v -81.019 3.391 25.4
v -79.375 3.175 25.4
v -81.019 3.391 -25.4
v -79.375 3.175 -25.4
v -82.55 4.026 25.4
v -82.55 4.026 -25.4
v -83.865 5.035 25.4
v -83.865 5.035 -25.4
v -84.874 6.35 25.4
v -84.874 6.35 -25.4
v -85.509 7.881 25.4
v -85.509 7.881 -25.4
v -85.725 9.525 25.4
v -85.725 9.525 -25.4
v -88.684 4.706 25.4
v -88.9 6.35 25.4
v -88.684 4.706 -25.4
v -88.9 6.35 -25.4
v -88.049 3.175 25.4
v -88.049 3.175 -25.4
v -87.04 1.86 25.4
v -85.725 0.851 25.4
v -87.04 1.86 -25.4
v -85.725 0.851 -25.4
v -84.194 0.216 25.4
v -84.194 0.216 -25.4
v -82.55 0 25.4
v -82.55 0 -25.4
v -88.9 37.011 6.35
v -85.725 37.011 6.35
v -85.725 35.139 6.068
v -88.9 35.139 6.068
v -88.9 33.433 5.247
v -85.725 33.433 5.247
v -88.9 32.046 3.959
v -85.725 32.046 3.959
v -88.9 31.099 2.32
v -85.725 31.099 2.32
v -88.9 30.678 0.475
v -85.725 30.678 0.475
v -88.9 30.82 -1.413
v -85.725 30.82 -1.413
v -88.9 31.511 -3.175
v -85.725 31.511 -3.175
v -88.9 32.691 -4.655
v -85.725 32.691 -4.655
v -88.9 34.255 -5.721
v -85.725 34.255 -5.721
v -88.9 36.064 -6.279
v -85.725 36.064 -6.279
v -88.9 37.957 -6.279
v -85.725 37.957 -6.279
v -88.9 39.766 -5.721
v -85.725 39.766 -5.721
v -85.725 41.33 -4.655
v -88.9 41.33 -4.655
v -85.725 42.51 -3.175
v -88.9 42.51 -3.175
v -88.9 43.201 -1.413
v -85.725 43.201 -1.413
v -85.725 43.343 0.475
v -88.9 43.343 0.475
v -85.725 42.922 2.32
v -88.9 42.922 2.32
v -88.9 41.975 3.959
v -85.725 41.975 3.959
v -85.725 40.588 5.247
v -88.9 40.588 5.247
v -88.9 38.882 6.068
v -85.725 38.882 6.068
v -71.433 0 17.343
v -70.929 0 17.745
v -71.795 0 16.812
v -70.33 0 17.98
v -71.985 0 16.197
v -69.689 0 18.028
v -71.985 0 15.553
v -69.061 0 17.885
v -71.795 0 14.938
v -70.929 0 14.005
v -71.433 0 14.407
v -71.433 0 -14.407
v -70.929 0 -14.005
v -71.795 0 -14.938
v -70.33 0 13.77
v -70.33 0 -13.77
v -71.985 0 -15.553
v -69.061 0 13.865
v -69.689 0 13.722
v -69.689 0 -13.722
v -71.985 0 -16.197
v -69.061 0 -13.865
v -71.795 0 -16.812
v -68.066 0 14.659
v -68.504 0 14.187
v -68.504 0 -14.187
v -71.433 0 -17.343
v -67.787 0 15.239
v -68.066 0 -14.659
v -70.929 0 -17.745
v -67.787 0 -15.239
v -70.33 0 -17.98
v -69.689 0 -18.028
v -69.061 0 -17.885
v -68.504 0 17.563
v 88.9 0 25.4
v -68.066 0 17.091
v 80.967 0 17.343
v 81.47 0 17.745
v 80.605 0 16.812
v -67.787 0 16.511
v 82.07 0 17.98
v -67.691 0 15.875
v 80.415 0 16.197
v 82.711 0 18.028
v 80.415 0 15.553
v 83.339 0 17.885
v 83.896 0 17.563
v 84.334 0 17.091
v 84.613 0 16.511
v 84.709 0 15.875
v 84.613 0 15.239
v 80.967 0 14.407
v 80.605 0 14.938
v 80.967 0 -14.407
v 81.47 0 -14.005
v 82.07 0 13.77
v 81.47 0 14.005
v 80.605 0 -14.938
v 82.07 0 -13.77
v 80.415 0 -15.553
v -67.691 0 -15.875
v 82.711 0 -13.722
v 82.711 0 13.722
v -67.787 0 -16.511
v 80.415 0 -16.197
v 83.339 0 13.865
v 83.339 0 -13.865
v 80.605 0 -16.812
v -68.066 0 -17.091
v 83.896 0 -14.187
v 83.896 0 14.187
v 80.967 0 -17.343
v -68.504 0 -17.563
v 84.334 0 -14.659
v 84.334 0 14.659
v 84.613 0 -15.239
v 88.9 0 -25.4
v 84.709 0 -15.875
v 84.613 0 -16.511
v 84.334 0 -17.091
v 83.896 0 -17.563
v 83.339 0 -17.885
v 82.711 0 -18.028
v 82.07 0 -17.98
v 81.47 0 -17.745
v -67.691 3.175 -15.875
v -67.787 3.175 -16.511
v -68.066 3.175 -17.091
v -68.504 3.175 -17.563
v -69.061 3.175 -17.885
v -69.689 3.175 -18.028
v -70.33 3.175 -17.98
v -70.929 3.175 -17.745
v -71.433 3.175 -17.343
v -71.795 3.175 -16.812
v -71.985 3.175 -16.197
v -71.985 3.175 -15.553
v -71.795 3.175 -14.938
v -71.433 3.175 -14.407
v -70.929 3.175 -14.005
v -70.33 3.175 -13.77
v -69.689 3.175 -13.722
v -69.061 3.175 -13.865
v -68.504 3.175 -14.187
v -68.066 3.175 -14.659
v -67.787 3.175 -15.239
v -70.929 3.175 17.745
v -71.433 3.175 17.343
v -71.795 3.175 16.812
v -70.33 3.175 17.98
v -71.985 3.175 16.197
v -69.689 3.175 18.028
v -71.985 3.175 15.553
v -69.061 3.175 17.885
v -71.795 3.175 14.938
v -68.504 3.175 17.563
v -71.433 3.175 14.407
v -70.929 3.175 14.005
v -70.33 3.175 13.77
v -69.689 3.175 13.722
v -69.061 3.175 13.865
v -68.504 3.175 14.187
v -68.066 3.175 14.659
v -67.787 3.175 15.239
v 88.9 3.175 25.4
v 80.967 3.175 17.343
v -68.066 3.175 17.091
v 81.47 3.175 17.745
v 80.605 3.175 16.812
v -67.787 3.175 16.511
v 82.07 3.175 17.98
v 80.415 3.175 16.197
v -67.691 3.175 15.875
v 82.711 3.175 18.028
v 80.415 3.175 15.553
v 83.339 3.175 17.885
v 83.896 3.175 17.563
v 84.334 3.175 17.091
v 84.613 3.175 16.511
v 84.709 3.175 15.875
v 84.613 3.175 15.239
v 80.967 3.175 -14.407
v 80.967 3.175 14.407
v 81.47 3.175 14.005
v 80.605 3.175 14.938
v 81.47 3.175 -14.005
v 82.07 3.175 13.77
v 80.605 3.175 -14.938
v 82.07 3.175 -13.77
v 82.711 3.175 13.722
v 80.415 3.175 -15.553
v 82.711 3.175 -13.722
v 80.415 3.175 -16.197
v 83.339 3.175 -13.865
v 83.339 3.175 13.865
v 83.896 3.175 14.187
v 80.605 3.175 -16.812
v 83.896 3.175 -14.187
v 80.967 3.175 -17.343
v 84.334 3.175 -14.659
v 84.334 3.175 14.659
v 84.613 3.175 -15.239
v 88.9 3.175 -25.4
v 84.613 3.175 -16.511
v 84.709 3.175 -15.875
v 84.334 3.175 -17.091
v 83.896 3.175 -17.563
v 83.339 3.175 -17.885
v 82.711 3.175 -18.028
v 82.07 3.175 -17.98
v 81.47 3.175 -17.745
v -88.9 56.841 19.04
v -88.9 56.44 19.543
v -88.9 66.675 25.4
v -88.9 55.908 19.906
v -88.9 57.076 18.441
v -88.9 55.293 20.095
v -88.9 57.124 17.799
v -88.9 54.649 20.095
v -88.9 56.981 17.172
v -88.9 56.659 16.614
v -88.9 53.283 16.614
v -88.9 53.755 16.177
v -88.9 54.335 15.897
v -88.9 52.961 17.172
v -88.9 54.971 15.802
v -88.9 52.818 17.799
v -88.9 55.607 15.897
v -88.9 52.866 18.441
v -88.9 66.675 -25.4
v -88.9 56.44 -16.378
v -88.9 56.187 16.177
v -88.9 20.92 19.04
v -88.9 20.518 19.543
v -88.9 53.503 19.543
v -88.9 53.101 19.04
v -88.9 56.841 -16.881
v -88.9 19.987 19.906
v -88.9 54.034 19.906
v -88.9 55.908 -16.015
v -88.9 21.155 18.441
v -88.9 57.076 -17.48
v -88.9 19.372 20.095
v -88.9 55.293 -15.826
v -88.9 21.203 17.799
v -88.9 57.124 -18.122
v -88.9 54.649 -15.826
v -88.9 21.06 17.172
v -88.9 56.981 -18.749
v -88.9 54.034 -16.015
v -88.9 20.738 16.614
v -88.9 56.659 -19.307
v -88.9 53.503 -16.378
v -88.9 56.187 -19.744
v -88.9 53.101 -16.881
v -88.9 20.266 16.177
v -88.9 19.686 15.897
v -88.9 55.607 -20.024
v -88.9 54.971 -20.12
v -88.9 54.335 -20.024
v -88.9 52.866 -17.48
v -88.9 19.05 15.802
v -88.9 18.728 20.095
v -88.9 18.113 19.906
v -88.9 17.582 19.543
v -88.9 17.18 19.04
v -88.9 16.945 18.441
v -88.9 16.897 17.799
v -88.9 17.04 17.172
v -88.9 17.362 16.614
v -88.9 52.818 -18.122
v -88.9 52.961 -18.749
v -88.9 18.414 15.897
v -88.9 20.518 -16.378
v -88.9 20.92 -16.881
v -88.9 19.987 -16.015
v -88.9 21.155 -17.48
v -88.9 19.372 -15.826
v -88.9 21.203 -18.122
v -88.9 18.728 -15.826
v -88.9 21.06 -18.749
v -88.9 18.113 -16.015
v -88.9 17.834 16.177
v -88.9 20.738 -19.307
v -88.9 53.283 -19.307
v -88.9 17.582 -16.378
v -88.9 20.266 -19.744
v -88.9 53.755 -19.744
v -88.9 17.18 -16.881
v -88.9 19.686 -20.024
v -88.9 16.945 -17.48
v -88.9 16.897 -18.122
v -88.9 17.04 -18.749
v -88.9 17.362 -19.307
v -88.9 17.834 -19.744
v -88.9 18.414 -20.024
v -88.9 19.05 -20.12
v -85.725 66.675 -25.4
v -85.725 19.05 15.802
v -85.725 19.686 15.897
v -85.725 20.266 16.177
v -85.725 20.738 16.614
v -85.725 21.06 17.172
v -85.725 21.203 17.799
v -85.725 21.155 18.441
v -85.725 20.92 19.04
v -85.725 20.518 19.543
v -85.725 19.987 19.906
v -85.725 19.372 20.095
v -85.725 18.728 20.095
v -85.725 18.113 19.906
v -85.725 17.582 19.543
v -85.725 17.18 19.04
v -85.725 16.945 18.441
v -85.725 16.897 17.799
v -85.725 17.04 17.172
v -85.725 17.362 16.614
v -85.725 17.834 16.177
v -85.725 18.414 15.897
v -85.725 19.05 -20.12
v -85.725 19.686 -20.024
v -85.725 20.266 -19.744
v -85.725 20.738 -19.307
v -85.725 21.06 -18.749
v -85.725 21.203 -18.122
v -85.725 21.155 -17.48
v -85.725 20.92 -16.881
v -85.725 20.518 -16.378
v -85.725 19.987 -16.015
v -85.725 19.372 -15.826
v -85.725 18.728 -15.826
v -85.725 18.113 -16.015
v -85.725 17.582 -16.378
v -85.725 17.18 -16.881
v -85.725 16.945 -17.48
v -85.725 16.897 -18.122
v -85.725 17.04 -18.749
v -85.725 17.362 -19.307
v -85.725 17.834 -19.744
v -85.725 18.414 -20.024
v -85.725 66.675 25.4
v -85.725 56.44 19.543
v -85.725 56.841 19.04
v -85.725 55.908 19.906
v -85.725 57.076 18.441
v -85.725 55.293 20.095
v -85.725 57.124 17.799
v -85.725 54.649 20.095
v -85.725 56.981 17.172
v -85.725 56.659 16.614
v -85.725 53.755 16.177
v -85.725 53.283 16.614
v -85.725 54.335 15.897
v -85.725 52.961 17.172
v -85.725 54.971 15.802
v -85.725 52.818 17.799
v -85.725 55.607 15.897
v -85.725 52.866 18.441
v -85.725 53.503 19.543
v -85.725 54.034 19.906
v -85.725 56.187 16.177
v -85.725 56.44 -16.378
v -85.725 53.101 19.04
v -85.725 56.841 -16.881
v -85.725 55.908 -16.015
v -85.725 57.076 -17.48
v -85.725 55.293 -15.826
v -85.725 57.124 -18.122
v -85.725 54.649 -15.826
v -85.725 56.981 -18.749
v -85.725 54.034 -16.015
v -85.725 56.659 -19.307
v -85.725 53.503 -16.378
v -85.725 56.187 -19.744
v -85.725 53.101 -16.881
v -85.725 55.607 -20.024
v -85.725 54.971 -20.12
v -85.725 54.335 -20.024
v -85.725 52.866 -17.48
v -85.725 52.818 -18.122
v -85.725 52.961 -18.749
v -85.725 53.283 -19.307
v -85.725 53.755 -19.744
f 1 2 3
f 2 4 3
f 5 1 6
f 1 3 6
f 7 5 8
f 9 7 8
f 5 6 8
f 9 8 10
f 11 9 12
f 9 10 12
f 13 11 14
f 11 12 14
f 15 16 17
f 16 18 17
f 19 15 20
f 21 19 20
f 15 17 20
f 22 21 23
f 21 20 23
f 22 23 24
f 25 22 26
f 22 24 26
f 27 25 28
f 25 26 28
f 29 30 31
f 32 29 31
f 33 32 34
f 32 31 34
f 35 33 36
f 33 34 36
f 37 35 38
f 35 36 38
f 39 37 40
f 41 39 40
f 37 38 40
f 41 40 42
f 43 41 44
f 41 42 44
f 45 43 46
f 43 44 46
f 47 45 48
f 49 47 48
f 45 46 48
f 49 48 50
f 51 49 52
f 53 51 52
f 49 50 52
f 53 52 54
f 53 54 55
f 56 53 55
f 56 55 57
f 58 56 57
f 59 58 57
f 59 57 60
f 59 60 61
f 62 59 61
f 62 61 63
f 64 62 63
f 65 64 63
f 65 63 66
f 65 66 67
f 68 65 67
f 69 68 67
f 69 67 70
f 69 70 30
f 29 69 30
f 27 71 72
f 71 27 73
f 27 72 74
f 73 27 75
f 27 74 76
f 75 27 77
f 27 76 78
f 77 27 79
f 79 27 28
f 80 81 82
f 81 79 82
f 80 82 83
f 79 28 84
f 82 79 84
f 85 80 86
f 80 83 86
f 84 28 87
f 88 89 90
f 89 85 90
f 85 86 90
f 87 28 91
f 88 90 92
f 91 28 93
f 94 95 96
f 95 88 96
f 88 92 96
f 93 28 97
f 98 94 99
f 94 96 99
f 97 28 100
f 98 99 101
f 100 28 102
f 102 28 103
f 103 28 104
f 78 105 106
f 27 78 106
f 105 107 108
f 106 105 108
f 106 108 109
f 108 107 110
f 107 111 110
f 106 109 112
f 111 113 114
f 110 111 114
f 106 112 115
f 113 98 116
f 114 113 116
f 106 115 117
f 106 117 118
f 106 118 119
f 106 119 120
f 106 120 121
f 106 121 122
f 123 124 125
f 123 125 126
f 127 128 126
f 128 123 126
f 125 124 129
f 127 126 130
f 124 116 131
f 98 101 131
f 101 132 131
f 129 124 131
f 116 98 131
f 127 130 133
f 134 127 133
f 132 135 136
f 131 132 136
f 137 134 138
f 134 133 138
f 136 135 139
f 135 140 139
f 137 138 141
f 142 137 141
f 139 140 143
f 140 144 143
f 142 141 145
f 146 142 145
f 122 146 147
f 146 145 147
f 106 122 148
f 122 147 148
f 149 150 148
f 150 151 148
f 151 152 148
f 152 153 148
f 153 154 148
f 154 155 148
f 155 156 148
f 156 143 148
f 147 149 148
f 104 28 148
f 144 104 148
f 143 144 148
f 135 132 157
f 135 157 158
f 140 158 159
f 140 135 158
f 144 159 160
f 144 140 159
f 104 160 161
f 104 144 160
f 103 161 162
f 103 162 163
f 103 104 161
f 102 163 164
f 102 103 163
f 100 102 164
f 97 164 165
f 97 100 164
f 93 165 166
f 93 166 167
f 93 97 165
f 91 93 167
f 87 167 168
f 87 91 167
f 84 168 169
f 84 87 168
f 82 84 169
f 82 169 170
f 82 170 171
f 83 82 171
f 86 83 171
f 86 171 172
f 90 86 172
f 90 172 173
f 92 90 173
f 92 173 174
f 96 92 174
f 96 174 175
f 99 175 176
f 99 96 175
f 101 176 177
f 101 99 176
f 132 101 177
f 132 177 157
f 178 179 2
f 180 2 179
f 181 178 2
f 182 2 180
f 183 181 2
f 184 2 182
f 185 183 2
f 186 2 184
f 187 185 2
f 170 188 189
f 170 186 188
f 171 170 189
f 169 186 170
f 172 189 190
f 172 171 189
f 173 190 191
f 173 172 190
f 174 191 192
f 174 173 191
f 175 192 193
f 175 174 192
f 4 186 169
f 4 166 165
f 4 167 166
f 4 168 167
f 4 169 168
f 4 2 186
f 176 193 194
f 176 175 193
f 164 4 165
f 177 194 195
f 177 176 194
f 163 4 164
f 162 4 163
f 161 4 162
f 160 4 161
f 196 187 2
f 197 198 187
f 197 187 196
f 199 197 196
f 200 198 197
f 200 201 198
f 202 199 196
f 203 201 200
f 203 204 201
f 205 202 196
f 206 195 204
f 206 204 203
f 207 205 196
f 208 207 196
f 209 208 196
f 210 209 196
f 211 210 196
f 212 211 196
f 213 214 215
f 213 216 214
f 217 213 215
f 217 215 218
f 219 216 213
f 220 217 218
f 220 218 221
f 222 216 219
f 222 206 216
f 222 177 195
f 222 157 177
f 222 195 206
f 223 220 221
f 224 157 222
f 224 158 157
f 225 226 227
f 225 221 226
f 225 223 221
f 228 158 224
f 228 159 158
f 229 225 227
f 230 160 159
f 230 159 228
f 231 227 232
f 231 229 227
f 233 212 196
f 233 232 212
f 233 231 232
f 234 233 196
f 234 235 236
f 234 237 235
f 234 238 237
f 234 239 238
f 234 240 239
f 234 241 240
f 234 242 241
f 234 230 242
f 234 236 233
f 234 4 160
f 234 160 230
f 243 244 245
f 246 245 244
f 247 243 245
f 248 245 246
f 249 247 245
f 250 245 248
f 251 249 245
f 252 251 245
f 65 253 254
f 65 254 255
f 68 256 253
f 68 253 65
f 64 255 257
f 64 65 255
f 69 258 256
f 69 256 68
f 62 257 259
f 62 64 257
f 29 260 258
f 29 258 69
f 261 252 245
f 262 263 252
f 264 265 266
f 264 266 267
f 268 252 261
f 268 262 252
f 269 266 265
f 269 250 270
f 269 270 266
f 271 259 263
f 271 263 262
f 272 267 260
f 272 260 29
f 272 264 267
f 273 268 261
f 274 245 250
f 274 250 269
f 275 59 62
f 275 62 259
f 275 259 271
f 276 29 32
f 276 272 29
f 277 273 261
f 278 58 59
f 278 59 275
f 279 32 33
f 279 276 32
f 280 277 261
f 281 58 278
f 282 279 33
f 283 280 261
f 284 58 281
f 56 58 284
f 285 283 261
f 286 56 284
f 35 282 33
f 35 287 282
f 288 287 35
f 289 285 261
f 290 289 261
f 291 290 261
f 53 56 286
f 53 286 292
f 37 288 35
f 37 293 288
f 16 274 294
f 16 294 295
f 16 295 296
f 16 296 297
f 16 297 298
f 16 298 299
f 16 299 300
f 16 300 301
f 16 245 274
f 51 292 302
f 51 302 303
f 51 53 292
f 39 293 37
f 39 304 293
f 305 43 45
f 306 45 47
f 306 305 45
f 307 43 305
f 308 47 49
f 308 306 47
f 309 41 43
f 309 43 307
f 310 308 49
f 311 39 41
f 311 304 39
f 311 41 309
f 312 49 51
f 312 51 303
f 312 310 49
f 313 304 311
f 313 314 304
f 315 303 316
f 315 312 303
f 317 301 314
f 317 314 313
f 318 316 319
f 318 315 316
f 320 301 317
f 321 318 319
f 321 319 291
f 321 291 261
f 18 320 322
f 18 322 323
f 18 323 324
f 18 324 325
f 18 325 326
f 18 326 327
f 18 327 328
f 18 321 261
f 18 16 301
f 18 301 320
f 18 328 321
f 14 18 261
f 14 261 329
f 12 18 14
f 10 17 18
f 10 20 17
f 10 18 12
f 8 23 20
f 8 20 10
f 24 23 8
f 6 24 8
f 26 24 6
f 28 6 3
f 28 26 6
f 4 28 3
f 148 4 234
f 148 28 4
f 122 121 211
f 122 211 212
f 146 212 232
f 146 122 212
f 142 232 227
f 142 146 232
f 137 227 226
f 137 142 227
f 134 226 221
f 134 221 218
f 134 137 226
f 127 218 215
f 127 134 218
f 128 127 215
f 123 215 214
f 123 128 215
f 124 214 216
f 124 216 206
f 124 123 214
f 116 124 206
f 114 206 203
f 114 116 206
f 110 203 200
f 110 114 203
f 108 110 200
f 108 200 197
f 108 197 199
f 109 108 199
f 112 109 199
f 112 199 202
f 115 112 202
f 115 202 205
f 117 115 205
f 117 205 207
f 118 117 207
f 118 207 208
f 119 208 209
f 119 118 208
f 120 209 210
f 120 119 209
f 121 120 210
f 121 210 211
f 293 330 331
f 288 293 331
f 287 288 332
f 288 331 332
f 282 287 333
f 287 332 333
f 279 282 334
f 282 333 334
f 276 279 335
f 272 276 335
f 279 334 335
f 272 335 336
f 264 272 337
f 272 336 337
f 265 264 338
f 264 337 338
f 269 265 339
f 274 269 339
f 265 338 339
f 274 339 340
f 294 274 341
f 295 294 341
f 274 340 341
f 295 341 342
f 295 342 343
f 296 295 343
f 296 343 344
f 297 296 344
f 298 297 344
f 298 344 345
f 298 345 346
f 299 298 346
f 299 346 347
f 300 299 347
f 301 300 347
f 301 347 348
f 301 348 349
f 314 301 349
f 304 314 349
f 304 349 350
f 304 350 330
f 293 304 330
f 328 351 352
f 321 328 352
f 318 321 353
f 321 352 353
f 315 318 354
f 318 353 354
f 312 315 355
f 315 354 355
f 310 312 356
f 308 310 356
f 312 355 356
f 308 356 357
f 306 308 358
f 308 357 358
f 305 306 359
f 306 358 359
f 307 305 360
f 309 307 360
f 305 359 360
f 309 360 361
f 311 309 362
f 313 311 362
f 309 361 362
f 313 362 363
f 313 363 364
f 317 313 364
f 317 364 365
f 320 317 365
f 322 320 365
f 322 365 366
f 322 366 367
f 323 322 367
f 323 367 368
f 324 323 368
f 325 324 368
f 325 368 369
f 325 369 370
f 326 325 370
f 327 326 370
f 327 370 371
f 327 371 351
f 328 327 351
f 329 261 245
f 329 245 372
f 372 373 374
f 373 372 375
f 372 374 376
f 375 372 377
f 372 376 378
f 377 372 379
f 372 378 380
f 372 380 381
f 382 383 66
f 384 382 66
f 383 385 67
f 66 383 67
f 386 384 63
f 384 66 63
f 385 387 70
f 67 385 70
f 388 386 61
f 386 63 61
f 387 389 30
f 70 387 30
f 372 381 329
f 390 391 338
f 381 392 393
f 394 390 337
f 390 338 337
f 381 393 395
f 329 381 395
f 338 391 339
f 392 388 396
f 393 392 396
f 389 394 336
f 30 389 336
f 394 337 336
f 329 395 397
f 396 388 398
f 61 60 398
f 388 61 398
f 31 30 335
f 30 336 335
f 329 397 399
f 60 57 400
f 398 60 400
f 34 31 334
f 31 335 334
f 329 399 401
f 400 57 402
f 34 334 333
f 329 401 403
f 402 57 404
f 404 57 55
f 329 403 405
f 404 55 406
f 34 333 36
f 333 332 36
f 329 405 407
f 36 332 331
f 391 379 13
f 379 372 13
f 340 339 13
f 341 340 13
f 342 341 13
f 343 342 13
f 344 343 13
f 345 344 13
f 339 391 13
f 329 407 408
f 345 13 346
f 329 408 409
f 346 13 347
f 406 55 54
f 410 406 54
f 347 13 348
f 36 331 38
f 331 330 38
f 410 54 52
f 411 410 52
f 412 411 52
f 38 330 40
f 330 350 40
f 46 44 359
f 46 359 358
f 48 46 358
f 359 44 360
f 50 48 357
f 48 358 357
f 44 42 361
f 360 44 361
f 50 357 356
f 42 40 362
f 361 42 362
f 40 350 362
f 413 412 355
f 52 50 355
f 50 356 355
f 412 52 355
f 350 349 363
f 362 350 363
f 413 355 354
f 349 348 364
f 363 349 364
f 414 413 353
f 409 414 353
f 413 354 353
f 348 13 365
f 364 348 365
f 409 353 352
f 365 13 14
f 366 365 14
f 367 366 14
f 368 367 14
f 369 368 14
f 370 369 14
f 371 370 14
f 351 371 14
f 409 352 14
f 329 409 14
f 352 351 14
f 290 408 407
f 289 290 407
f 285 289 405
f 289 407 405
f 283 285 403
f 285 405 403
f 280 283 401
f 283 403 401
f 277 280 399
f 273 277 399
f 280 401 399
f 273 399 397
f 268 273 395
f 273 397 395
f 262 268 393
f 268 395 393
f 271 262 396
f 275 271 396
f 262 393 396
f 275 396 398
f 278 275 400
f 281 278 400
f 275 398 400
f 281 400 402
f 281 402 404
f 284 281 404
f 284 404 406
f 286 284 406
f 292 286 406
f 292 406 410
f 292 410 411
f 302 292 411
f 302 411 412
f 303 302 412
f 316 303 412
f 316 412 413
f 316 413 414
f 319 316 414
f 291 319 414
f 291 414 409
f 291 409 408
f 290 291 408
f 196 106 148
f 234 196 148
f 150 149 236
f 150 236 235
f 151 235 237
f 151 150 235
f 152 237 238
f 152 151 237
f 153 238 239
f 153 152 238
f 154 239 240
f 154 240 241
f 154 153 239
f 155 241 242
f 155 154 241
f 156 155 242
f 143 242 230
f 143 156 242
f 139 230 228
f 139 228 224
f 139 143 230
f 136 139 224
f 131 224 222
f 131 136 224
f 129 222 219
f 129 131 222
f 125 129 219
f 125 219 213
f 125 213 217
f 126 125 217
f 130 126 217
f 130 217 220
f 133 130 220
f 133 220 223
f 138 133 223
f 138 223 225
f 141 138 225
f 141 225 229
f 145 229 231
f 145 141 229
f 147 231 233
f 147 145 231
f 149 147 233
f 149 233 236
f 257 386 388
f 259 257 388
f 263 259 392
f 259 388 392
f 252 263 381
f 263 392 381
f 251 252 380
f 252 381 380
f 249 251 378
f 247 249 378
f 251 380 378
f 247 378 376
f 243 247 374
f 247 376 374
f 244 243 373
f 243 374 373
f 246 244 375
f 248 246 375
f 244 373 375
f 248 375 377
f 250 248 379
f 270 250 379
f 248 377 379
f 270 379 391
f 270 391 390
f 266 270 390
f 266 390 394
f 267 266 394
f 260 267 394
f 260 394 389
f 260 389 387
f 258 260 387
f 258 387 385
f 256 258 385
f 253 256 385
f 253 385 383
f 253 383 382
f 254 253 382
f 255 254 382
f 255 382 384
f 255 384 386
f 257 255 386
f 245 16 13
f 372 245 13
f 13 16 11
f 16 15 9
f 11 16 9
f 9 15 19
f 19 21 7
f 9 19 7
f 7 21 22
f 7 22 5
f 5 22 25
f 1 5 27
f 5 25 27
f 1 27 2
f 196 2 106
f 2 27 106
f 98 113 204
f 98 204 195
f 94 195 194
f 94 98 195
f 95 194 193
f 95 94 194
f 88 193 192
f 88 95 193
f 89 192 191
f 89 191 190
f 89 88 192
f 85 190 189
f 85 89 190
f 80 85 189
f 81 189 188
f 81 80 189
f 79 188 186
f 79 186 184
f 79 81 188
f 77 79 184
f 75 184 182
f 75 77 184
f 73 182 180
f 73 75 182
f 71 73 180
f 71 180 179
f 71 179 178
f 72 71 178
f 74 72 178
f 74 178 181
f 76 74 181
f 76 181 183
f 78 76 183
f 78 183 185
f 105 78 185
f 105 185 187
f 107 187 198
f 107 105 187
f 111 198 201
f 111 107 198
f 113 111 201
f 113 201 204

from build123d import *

# Parameters (mm, degrees)
SKETCH1_W               = 177.8
SKETCH1_H               = 50.8
BOSS_EXTRUDE1_DEPTH     = 3.175
SKETCH2_W               = 3.175
SKETCH2_H               = 50.8
BOSS_EXTRUDE2_DEPTH     = 63.5
FILLET1_R               = 6.35
F_1_0MM_DOWEL_HOLE1_D   = 4.318
F_1_0MM_DOWEL_HOLE2_D   = 12.7
ADVANCEDHOLE1_OUTLINE_R = 2.159
ADVANCEDHOLE1_DEPTH     = 3.175


# Read off the part's stored shape, not the designer's step: AdvancedHole1
with BuildPart() as part:
    # Sketch1 → Boss-Extrude1 (new body)
    with BuildSketch(Plane(origin=(0, 0, 0), x_dir=(1, 0, 0), z_dir=(0, 1, 0))):
        Rectangle(SKETCH1_W, SKETCH1_H)
    extrude(amount=BOSS_EXTRUDE1_DEPTH)

    # Sketch2 → Boss-Extrude2 (add)
    with BuildSketch(Plane(origin=(0, 3.175, 0), x_dir=(1, 0, 0), z_dir=(0, 1, 0))):
        with Locations((-87.3125, 0)):
            Rectangle(SKETCH2_W, SKETCH2_H)
    extrude(amount=BOSS_EXTRUDE2_DEPTH)

    # Fillet1
    fillet1_edges = [part.edges().sort_by_distance(p)[0] for p in [
        (-85.725, 3.175, 0),
        (-88.9, 0, 0),
    ]]
    fillet(fillet1_edges, radius=FILLET1_R)

    # Ø1.0mm Dowel Hole1 (through all)
    with Locations(Plane.ZY.offset(88.9)):
        with Locations((-17.960512212, 54.971024484), (17.960512272, 54.971024484), (17.960512272, 19.05), (-17.960512212, 19.05)):
            Hole(F_1_0MM_DOWEL_HOLE1_D / 2)

    # Ø1.0mm Dowel Hole2 (through all)
    with Locations(Plane(origin=(-88.9, 37.010512242, 3e-08), x_dir=(0, 0, -1), z_dir=(-1, 0, 0))):
        with Locations((0, 0)):
            Hole(F_1_0MM_DOWEL_HOLE2_D / 2)

    # AdvancedHole1 outline → AdvancedHole1 (cut)
    with BuildSketch(Plane(origin=(0, 0, 0), x_dir=(1, 0, 0), z_dir=(0, 1, 0))):
        with Locations((-69.85, -15.875)):
            Circle(ADVANCEDHOLE1_OUTLINE_R)
        with Locations((-69.85, 15.875)):
            Circle(ADVANCEDHOLE1_OUTLINE_R)
        with Locations((82.55, 15.875)):
            Circle(ADVANCEDHOLE1_OUTLINE_R)
        with Locations((82.55, -15.875)):
            Circle(ADVANCEDHOLE1_OUTLINE_R)
    extrude(amount=ADVANCEDHOLE1_DEPTH, mode=Mode.SUBTRACT)


solid = part.part
